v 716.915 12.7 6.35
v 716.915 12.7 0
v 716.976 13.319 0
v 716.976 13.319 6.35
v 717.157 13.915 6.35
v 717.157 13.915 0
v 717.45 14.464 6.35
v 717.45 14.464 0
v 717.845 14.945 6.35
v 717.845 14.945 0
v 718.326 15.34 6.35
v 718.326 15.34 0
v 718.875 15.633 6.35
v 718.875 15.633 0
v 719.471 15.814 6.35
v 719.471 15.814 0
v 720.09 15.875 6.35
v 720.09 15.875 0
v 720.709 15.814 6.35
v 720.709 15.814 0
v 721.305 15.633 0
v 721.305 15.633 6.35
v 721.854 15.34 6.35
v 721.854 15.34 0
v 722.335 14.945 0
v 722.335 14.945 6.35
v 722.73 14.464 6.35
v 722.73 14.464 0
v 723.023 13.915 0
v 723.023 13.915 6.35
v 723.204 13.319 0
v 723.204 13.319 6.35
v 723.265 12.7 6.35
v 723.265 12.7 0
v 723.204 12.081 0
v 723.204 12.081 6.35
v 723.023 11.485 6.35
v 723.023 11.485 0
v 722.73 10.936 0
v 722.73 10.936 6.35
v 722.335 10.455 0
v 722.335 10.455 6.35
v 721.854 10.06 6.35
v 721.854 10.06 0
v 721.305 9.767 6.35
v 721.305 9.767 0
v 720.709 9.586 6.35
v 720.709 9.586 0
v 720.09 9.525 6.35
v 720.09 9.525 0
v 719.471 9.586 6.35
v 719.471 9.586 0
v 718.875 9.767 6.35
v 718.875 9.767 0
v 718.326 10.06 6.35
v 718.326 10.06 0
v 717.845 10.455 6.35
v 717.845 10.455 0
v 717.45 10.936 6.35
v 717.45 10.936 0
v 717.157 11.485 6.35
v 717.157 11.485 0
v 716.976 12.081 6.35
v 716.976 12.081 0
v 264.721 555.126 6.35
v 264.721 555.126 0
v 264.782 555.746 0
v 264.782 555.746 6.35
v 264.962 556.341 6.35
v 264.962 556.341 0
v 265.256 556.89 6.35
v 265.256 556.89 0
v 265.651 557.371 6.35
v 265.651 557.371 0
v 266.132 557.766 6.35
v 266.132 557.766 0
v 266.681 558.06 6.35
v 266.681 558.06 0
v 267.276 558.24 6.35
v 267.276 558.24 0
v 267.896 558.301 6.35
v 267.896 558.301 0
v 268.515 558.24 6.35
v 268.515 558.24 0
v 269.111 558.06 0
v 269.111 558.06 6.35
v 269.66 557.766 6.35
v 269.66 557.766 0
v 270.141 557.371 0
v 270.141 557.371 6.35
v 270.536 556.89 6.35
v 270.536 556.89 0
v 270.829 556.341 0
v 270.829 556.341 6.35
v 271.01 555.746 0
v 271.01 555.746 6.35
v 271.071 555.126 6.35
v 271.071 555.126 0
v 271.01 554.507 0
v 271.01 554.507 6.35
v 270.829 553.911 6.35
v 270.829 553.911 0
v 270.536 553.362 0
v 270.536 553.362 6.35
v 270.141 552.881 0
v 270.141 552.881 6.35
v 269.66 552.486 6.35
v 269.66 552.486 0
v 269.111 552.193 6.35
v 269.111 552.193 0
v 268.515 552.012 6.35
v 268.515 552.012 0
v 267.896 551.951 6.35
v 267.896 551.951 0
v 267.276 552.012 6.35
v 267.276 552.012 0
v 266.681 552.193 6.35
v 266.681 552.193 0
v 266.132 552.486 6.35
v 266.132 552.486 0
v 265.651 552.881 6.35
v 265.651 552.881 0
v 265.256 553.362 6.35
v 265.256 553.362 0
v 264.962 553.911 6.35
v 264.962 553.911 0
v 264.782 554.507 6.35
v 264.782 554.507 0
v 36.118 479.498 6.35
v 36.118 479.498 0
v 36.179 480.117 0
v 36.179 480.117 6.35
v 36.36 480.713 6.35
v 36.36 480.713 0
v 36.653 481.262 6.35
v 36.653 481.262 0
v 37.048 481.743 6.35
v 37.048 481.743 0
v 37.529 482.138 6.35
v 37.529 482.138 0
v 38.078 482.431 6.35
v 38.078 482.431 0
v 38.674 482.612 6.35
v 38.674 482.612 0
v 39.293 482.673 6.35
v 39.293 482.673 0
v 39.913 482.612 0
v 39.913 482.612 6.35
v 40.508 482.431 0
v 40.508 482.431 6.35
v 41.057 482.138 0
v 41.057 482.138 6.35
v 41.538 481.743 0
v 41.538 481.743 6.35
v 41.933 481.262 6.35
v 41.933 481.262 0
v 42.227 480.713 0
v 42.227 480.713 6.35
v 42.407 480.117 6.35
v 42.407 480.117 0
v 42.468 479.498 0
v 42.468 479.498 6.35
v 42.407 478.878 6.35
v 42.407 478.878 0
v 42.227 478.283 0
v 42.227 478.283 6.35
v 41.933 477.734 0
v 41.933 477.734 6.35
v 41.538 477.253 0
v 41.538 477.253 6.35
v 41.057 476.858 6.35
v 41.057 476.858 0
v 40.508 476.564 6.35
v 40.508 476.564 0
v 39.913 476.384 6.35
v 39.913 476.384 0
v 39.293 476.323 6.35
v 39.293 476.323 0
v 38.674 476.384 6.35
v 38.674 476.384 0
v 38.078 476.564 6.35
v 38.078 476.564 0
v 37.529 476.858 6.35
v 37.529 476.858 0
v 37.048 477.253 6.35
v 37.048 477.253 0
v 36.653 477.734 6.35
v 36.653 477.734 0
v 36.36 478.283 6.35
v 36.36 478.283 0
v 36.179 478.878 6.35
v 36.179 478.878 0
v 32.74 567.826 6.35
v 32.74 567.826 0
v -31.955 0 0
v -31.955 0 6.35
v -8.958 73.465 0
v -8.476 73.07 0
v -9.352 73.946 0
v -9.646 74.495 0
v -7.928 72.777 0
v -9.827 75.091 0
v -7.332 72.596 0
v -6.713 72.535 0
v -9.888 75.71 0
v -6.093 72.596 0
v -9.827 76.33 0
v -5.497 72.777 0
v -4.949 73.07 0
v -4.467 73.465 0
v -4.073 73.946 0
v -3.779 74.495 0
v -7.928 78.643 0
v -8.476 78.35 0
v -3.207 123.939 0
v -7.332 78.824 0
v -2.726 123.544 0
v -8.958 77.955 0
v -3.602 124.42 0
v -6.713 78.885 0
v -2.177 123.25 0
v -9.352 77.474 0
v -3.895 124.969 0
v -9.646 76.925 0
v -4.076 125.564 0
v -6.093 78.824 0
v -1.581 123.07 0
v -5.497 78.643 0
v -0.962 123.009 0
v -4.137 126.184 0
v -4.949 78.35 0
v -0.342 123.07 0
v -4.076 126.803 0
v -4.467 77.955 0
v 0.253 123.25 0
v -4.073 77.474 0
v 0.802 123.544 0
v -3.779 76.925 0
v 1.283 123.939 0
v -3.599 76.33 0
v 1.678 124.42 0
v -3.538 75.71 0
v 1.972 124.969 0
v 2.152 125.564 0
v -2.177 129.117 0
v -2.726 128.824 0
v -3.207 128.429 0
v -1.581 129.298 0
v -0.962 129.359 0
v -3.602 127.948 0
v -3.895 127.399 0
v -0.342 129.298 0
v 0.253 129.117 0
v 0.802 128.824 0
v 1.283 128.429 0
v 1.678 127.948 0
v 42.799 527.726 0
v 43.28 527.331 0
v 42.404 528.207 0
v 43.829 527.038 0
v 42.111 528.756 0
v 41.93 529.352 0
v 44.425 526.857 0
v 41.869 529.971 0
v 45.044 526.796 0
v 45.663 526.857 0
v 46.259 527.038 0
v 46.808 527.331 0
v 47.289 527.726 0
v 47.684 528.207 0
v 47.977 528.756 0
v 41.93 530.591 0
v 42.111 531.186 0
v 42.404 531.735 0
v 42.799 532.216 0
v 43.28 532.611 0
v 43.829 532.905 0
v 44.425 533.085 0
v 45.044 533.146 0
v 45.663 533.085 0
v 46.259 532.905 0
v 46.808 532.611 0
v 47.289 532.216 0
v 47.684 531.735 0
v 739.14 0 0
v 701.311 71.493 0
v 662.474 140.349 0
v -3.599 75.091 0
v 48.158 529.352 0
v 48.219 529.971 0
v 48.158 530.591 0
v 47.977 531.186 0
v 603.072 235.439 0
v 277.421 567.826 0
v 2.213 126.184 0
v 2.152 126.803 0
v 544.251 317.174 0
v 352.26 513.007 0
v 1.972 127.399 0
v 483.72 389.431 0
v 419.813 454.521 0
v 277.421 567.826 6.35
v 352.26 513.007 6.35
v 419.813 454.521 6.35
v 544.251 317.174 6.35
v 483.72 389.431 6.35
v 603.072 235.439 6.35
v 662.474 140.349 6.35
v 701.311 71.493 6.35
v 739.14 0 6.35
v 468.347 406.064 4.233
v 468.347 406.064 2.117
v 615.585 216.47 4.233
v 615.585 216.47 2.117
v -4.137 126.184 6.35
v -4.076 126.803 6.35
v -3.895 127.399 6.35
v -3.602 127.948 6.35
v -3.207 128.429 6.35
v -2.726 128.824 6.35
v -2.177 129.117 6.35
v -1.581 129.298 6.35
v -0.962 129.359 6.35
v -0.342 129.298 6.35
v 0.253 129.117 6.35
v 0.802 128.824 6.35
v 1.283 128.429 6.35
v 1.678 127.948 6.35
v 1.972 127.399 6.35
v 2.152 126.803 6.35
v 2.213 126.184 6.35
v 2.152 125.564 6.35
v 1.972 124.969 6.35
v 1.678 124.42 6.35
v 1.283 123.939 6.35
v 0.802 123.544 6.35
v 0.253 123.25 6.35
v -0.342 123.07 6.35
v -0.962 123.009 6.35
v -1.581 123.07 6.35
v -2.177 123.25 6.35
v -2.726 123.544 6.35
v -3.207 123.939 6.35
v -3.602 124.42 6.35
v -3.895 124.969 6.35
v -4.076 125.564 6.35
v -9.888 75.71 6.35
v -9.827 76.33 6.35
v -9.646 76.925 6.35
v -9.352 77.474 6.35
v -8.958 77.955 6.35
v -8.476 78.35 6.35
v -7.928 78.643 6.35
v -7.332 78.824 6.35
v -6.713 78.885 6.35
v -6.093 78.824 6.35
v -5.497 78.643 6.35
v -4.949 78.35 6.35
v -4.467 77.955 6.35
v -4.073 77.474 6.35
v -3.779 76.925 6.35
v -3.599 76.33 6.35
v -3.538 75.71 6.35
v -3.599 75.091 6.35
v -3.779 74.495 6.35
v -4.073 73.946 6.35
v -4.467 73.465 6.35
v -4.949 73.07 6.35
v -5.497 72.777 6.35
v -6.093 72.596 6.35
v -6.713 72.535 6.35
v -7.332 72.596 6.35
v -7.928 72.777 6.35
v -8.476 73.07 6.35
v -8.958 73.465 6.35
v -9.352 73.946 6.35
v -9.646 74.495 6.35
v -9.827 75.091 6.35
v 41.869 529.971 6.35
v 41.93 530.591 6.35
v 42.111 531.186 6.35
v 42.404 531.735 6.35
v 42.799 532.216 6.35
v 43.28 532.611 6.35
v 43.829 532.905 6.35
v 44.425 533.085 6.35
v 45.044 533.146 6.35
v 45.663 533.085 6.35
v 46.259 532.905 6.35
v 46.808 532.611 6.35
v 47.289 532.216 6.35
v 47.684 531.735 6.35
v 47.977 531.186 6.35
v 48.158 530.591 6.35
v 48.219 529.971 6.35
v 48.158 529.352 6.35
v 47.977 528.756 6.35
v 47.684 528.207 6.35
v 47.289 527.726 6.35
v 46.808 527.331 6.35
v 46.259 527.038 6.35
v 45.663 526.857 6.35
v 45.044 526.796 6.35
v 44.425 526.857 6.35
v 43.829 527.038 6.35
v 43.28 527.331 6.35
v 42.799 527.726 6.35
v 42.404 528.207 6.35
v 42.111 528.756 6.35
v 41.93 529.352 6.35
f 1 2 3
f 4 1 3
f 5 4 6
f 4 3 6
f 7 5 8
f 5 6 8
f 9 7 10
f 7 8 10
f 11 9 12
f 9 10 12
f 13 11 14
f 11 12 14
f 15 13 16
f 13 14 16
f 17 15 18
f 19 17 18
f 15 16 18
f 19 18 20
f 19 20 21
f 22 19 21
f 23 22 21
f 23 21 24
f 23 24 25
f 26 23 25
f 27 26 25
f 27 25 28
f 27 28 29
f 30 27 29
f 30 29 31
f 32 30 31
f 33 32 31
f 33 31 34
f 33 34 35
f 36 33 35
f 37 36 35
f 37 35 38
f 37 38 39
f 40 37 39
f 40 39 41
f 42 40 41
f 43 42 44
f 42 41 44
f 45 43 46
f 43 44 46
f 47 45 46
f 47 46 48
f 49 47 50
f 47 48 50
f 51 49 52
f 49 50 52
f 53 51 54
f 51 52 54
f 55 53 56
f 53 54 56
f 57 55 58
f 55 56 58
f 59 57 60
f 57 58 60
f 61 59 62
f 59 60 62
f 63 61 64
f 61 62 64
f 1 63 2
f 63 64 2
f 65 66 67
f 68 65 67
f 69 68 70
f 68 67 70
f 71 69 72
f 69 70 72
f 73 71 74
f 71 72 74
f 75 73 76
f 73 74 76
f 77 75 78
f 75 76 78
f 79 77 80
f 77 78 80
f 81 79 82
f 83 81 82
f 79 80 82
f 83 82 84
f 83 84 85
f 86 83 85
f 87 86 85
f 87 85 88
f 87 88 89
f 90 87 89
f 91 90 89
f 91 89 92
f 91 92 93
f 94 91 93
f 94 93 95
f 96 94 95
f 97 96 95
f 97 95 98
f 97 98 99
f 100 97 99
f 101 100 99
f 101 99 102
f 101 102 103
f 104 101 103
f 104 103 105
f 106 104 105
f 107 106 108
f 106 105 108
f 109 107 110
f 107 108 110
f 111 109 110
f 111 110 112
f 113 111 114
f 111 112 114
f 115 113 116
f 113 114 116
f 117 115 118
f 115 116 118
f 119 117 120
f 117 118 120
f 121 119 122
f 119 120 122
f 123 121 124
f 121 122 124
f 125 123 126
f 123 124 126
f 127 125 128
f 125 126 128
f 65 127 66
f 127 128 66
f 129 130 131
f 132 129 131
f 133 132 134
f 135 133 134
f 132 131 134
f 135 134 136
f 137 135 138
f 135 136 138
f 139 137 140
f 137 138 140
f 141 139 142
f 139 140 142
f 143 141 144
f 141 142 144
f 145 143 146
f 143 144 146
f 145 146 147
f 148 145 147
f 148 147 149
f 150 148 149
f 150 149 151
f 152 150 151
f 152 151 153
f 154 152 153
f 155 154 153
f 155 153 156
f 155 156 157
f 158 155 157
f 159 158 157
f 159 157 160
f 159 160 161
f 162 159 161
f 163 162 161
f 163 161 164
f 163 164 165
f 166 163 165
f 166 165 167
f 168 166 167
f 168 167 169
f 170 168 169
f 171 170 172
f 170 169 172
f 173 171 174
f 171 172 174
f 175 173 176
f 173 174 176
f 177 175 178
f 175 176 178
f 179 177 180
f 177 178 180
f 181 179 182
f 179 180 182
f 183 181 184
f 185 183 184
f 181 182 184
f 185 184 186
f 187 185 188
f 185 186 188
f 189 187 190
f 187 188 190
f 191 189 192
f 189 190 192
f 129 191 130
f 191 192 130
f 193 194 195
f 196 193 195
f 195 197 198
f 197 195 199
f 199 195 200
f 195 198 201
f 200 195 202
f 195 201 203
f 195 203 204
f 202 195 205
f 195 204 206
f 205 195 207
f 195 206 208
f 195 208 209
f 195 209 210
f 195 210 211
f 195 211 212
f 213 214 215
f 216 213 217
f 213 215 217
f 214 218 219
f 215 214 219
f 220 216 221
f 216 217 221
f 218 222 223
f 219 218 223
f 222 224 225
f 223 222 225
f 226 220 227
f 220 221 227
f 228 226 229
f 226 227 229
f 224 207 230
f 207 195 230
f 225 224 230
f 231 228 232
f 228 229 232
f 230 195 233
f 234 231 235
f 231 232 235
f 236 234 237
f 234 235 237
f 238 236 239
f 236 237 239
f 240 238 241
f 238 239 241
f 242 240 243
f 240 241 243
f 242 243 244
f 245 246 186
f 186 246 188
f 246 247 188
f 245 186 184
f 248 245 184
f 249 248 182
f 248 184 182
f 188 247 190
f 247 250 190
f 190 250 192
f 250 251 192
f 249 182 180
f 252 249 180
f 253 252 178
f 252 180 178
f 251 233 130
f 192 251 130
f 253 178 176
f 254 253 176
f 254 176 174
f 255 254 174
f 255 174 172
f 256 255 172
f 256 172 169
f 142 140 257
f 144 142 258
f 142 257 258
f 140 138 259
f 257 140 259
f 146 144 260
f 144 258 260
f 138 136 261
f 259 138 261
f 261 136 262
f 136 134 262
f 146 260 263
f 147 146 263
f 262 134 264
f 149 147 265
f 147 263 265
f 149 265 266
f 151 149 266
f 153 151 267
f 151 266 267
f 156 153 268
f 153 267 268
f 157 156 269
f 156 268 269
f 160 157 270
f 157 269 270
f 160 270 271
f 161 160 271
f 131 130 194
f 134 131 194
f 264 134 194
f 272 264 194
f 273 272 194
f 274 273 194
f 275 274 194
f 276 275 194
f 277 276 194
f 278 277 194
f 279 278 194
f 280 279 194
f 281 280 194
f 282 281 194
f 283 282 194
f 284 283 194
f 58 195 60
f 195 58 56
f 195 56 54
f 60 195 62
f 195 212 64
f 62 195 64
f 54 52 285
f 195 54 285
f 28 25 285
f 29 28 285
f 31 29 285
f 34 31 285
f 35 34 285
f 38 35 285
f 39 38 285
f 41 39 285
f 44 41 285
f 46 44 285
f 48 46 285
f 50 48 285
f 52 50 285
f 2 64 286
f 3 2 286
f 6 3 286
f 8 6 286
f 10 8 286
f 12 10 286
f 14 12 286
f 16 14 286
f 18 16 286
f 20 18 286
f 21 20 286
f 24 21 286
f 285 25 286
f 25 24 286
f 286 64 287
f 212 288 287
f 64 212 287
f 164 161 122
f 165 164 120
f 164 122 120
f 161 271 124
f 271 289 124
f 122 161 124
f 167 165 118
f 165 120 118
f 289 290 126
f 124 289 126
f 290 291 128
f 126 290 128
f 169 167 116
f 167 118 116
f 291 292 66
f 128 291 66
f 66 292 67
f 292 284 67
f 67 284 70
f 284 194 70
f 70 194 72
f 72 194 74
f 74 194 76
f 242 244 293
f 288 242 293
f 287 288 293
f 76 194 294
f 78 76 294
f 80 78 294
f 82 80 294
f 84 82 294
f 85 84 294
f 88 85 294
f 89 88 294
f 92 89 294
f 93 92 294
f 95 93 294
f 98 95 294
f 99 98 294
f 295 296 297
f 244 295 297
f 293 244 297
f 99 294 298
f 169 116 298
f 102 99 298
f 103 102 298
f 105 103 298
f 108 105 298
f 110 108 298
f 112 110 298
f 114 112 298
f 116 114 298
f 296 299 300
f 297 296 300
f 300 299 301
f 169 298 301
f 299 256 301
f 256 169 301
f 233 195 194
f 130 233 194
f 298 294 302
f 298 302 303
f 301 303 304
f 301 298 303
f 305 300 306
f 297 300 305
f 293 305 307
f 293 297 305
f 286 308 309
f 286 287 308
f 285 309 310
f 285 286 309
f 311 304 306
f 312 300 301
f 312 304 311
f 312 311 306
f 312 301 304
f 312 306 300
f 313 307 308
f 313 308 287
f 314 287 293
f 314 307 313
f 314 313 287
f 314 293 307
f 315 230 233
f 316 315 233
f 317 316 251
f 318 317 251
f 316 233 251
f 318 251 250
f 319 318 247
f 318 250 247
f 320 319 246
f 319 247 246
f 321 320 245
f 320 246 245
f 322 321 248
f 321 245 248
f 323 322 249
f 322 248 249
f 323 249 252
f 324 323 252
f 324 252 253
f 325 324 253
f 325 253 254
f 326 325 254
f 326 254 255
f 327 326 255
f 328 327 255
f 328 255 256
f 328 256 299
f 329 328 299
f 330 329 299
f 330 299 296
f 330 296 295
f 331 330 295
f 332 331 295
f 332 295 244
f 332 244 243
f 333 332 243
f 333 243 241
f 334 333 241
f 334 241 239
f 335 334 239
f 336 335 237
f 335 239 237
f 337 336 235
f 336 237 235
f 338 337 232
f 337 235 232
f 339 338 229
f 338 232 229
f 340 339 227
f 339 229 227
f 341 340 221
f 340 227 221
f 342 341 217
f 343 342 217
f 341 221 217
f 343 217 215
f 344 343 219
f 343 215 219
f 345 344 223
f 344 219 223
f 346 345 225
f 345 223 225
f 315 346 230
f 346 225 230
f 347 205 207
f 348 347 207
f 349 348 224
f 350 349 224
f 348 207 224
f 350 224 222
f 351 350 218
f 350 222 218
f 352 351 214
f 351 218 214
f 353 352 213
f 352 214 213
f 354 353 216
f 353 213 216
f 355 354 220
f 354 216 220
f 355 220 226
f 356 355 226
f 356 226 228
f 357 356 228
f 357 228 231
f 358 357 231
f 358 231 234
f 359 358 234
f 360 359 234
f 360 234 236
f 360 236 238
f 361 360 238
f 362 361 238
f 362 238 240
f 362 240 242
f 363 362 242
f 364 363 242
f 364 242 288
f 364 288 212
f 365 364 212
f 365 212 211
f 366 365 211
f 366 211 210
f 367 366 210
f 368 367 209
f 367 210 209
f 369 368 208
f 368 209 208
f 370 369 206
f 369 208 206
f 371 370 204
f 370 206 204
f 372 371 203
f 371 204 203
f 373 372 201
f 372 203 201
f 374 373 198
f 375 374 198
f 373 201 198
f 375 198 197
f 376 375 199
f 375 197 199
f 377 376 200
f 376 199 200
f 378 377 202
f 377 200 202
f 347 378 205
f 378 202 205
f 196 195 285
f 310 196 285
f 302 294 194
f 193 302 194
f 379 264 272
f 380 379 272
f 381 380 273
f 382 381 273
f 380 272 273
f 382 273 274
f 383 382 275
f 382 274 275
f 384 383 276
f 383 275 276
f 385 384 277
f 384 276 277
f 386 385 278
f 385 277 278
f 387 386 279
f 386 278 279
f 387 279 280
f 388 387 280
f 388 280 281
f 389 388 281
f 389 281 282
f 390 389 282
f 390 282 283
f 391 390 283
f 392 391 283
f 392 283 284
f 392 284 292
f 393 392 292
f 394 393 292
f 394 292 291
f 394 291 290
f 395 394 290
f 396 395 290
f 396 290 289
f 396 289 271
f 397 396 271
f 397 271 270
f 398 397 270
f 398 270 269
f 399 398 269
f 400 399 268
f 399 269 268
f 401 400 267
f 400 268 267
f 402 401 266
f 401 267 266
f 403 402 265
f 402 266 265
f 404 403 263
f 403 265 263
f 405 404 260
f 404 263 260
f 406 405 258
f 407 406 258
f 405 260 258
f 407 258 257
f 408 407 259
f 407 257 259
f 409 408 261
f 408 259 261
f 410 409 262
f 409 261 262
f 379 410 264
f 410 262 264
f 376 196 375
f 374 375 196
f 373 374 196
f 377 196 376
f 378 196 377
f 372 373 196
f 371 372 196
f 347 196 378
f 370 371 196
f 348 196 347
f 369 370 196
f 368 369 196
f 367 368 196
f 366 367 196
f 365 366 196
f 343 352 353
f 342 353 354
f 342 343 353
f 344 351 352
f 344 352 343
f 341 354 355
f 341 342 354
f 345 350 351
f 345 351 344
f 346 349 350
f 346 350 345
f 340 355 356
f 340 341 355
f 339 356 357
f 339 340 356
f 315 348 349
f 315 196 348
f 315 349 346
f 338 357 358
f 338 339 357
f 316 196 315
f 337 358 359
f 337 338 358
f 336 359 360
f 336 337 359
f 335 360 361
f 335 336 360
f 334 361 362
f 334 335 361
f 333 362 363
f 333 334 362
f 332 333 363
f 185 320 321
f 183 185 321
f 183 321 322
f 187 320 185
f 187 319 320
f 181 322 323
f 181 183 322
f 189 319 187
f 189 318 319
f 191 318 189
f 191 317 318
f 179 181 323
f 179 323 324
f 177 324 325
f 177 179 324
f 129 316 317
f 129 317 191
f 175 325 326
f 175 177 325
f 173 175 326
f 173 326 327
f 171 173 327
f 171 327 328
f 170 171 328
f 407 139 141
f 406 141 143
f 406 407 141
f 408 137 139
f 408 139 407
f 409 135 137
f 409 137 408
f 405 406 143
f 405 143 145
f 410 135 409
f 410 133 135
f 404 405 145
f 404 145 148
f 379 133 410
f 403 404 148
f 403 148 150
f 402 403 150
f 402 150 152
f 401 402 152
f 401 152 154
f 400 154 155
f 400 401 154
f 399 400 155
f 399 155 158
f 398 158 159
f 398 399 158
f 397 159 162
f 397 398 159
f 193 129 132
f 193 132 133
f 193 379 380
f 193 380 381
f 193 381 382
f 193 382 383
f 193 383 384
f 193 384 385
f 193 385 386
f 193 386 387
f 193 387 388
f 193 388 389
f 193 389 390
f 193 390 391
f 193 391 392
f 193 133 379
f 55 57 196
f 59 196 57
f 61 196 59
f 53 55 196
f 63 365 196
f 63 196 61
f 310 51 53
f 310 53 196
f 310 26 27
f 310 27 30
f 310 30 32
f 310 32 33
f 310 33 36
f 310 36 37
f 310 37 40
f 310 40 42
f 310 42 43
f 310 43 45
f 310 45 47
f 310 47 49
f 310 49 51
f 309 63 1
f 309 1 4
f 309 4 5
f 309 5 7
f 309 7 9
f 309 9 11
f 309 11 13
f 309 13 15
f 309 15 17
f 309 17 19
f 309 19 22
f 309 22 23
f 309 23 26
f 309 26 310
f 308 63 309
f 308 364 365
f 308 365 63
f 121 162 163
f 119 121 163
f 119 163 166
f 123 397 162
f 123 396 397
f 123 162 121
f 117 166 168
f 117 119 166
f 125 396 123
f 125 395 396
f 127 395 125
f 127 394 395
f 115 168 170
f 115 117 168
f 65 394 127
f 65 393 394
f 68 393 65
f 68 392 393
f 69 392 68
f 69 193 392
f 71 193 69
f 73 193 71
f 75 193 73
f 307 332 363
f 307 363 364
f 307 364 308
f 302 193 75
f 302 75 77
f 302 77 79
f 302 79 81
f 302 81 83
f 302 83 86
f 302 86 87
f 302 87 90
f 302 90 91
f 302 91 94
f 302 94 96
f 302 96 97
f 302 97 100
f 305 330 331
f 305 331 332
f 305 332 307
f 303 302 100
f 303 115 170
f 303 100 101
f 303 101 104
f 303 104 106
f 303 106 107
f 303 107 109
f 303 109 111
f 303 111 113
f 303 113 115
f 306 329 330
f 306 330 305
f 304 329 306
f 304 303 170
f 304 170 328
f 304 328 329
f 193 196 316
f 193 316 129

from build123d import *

# Parameters (mm, degrees)
BOSS_EXTRUDE1_DEPTH             = 6.35
BOSS_EXTRUDE2_DEPTH             = 6.35
F_1_4_0_25_DIAMETER_HOLE2_D     = 6.35
F_1_4_0_25_DIAMETER_HOLE3_D     = 6.35
F_1_4_0_25_DIAMETER_HOLE3_DEPTH = 6.35


with BuildPart() as part:
    # Sketch1 → Boss-Extrude1 (new body)
    with BuildSketch(Plane.XY):
        with BuildLine():
            Line((0, 0), (739.14, 0))
            add(Edge.make_bspline(
                [(277.420636668, 567.826315519), (496.859161811, 420.297110317), (620.758181585, 229.590161119), (739.14, 0)],
                knots=[0, 0, 0, 0, 1, 1, 1, 1], degree=3))
            Line((277.420636668, 567.826315519), (64.695636668, 567.826315519))
            Line((64.695636668, 567.826315519), (0, 0))
        make_face()
    extrude(amount=BOSS_EXTRUDE1_DEPTH)

    # Sketch5 → Boss-Extrude2 (add)
    with BuildSketch(Plane(origin=(0, 0, 0), x_dir=(-1, 0, 0), z_dir=(0, 0, -1))):
        Polygon((-64.695636668, 567.826315519), (-32.740222655, 567.826315519), (31.955414013, 0), (0, 0), align=None)
    extrude(amount=-BOSS_EXTRUDE2_DEPTH)

    # 1/4 (0.25) Diameter Hole2 (through all)
    with Locations(Plane.XY.offset(6.35)):
        with Locations((-6.712513837, 75.710175403), (-0.961790578, 126.183625671), (39.293272238, 479.49777755), (45.043995497, 529.971227818)):
            Hole(F_1_4_0_25_DIAMETER_HOLE2_D / 2)

    # 1/4 (0.25) Diameter Hole3
    with Locations(Plane.XY.offset(6.35)):
        with Locations((720.09, 12.7), (267.895636668, 555.126315519)):
            Hole(F_1_4_0_25_DIAMETER_HOLE3_D / 2, depth=F_1_4_0_25_DIAMETER_HOLE3_DEPTH)


solid = part.part
